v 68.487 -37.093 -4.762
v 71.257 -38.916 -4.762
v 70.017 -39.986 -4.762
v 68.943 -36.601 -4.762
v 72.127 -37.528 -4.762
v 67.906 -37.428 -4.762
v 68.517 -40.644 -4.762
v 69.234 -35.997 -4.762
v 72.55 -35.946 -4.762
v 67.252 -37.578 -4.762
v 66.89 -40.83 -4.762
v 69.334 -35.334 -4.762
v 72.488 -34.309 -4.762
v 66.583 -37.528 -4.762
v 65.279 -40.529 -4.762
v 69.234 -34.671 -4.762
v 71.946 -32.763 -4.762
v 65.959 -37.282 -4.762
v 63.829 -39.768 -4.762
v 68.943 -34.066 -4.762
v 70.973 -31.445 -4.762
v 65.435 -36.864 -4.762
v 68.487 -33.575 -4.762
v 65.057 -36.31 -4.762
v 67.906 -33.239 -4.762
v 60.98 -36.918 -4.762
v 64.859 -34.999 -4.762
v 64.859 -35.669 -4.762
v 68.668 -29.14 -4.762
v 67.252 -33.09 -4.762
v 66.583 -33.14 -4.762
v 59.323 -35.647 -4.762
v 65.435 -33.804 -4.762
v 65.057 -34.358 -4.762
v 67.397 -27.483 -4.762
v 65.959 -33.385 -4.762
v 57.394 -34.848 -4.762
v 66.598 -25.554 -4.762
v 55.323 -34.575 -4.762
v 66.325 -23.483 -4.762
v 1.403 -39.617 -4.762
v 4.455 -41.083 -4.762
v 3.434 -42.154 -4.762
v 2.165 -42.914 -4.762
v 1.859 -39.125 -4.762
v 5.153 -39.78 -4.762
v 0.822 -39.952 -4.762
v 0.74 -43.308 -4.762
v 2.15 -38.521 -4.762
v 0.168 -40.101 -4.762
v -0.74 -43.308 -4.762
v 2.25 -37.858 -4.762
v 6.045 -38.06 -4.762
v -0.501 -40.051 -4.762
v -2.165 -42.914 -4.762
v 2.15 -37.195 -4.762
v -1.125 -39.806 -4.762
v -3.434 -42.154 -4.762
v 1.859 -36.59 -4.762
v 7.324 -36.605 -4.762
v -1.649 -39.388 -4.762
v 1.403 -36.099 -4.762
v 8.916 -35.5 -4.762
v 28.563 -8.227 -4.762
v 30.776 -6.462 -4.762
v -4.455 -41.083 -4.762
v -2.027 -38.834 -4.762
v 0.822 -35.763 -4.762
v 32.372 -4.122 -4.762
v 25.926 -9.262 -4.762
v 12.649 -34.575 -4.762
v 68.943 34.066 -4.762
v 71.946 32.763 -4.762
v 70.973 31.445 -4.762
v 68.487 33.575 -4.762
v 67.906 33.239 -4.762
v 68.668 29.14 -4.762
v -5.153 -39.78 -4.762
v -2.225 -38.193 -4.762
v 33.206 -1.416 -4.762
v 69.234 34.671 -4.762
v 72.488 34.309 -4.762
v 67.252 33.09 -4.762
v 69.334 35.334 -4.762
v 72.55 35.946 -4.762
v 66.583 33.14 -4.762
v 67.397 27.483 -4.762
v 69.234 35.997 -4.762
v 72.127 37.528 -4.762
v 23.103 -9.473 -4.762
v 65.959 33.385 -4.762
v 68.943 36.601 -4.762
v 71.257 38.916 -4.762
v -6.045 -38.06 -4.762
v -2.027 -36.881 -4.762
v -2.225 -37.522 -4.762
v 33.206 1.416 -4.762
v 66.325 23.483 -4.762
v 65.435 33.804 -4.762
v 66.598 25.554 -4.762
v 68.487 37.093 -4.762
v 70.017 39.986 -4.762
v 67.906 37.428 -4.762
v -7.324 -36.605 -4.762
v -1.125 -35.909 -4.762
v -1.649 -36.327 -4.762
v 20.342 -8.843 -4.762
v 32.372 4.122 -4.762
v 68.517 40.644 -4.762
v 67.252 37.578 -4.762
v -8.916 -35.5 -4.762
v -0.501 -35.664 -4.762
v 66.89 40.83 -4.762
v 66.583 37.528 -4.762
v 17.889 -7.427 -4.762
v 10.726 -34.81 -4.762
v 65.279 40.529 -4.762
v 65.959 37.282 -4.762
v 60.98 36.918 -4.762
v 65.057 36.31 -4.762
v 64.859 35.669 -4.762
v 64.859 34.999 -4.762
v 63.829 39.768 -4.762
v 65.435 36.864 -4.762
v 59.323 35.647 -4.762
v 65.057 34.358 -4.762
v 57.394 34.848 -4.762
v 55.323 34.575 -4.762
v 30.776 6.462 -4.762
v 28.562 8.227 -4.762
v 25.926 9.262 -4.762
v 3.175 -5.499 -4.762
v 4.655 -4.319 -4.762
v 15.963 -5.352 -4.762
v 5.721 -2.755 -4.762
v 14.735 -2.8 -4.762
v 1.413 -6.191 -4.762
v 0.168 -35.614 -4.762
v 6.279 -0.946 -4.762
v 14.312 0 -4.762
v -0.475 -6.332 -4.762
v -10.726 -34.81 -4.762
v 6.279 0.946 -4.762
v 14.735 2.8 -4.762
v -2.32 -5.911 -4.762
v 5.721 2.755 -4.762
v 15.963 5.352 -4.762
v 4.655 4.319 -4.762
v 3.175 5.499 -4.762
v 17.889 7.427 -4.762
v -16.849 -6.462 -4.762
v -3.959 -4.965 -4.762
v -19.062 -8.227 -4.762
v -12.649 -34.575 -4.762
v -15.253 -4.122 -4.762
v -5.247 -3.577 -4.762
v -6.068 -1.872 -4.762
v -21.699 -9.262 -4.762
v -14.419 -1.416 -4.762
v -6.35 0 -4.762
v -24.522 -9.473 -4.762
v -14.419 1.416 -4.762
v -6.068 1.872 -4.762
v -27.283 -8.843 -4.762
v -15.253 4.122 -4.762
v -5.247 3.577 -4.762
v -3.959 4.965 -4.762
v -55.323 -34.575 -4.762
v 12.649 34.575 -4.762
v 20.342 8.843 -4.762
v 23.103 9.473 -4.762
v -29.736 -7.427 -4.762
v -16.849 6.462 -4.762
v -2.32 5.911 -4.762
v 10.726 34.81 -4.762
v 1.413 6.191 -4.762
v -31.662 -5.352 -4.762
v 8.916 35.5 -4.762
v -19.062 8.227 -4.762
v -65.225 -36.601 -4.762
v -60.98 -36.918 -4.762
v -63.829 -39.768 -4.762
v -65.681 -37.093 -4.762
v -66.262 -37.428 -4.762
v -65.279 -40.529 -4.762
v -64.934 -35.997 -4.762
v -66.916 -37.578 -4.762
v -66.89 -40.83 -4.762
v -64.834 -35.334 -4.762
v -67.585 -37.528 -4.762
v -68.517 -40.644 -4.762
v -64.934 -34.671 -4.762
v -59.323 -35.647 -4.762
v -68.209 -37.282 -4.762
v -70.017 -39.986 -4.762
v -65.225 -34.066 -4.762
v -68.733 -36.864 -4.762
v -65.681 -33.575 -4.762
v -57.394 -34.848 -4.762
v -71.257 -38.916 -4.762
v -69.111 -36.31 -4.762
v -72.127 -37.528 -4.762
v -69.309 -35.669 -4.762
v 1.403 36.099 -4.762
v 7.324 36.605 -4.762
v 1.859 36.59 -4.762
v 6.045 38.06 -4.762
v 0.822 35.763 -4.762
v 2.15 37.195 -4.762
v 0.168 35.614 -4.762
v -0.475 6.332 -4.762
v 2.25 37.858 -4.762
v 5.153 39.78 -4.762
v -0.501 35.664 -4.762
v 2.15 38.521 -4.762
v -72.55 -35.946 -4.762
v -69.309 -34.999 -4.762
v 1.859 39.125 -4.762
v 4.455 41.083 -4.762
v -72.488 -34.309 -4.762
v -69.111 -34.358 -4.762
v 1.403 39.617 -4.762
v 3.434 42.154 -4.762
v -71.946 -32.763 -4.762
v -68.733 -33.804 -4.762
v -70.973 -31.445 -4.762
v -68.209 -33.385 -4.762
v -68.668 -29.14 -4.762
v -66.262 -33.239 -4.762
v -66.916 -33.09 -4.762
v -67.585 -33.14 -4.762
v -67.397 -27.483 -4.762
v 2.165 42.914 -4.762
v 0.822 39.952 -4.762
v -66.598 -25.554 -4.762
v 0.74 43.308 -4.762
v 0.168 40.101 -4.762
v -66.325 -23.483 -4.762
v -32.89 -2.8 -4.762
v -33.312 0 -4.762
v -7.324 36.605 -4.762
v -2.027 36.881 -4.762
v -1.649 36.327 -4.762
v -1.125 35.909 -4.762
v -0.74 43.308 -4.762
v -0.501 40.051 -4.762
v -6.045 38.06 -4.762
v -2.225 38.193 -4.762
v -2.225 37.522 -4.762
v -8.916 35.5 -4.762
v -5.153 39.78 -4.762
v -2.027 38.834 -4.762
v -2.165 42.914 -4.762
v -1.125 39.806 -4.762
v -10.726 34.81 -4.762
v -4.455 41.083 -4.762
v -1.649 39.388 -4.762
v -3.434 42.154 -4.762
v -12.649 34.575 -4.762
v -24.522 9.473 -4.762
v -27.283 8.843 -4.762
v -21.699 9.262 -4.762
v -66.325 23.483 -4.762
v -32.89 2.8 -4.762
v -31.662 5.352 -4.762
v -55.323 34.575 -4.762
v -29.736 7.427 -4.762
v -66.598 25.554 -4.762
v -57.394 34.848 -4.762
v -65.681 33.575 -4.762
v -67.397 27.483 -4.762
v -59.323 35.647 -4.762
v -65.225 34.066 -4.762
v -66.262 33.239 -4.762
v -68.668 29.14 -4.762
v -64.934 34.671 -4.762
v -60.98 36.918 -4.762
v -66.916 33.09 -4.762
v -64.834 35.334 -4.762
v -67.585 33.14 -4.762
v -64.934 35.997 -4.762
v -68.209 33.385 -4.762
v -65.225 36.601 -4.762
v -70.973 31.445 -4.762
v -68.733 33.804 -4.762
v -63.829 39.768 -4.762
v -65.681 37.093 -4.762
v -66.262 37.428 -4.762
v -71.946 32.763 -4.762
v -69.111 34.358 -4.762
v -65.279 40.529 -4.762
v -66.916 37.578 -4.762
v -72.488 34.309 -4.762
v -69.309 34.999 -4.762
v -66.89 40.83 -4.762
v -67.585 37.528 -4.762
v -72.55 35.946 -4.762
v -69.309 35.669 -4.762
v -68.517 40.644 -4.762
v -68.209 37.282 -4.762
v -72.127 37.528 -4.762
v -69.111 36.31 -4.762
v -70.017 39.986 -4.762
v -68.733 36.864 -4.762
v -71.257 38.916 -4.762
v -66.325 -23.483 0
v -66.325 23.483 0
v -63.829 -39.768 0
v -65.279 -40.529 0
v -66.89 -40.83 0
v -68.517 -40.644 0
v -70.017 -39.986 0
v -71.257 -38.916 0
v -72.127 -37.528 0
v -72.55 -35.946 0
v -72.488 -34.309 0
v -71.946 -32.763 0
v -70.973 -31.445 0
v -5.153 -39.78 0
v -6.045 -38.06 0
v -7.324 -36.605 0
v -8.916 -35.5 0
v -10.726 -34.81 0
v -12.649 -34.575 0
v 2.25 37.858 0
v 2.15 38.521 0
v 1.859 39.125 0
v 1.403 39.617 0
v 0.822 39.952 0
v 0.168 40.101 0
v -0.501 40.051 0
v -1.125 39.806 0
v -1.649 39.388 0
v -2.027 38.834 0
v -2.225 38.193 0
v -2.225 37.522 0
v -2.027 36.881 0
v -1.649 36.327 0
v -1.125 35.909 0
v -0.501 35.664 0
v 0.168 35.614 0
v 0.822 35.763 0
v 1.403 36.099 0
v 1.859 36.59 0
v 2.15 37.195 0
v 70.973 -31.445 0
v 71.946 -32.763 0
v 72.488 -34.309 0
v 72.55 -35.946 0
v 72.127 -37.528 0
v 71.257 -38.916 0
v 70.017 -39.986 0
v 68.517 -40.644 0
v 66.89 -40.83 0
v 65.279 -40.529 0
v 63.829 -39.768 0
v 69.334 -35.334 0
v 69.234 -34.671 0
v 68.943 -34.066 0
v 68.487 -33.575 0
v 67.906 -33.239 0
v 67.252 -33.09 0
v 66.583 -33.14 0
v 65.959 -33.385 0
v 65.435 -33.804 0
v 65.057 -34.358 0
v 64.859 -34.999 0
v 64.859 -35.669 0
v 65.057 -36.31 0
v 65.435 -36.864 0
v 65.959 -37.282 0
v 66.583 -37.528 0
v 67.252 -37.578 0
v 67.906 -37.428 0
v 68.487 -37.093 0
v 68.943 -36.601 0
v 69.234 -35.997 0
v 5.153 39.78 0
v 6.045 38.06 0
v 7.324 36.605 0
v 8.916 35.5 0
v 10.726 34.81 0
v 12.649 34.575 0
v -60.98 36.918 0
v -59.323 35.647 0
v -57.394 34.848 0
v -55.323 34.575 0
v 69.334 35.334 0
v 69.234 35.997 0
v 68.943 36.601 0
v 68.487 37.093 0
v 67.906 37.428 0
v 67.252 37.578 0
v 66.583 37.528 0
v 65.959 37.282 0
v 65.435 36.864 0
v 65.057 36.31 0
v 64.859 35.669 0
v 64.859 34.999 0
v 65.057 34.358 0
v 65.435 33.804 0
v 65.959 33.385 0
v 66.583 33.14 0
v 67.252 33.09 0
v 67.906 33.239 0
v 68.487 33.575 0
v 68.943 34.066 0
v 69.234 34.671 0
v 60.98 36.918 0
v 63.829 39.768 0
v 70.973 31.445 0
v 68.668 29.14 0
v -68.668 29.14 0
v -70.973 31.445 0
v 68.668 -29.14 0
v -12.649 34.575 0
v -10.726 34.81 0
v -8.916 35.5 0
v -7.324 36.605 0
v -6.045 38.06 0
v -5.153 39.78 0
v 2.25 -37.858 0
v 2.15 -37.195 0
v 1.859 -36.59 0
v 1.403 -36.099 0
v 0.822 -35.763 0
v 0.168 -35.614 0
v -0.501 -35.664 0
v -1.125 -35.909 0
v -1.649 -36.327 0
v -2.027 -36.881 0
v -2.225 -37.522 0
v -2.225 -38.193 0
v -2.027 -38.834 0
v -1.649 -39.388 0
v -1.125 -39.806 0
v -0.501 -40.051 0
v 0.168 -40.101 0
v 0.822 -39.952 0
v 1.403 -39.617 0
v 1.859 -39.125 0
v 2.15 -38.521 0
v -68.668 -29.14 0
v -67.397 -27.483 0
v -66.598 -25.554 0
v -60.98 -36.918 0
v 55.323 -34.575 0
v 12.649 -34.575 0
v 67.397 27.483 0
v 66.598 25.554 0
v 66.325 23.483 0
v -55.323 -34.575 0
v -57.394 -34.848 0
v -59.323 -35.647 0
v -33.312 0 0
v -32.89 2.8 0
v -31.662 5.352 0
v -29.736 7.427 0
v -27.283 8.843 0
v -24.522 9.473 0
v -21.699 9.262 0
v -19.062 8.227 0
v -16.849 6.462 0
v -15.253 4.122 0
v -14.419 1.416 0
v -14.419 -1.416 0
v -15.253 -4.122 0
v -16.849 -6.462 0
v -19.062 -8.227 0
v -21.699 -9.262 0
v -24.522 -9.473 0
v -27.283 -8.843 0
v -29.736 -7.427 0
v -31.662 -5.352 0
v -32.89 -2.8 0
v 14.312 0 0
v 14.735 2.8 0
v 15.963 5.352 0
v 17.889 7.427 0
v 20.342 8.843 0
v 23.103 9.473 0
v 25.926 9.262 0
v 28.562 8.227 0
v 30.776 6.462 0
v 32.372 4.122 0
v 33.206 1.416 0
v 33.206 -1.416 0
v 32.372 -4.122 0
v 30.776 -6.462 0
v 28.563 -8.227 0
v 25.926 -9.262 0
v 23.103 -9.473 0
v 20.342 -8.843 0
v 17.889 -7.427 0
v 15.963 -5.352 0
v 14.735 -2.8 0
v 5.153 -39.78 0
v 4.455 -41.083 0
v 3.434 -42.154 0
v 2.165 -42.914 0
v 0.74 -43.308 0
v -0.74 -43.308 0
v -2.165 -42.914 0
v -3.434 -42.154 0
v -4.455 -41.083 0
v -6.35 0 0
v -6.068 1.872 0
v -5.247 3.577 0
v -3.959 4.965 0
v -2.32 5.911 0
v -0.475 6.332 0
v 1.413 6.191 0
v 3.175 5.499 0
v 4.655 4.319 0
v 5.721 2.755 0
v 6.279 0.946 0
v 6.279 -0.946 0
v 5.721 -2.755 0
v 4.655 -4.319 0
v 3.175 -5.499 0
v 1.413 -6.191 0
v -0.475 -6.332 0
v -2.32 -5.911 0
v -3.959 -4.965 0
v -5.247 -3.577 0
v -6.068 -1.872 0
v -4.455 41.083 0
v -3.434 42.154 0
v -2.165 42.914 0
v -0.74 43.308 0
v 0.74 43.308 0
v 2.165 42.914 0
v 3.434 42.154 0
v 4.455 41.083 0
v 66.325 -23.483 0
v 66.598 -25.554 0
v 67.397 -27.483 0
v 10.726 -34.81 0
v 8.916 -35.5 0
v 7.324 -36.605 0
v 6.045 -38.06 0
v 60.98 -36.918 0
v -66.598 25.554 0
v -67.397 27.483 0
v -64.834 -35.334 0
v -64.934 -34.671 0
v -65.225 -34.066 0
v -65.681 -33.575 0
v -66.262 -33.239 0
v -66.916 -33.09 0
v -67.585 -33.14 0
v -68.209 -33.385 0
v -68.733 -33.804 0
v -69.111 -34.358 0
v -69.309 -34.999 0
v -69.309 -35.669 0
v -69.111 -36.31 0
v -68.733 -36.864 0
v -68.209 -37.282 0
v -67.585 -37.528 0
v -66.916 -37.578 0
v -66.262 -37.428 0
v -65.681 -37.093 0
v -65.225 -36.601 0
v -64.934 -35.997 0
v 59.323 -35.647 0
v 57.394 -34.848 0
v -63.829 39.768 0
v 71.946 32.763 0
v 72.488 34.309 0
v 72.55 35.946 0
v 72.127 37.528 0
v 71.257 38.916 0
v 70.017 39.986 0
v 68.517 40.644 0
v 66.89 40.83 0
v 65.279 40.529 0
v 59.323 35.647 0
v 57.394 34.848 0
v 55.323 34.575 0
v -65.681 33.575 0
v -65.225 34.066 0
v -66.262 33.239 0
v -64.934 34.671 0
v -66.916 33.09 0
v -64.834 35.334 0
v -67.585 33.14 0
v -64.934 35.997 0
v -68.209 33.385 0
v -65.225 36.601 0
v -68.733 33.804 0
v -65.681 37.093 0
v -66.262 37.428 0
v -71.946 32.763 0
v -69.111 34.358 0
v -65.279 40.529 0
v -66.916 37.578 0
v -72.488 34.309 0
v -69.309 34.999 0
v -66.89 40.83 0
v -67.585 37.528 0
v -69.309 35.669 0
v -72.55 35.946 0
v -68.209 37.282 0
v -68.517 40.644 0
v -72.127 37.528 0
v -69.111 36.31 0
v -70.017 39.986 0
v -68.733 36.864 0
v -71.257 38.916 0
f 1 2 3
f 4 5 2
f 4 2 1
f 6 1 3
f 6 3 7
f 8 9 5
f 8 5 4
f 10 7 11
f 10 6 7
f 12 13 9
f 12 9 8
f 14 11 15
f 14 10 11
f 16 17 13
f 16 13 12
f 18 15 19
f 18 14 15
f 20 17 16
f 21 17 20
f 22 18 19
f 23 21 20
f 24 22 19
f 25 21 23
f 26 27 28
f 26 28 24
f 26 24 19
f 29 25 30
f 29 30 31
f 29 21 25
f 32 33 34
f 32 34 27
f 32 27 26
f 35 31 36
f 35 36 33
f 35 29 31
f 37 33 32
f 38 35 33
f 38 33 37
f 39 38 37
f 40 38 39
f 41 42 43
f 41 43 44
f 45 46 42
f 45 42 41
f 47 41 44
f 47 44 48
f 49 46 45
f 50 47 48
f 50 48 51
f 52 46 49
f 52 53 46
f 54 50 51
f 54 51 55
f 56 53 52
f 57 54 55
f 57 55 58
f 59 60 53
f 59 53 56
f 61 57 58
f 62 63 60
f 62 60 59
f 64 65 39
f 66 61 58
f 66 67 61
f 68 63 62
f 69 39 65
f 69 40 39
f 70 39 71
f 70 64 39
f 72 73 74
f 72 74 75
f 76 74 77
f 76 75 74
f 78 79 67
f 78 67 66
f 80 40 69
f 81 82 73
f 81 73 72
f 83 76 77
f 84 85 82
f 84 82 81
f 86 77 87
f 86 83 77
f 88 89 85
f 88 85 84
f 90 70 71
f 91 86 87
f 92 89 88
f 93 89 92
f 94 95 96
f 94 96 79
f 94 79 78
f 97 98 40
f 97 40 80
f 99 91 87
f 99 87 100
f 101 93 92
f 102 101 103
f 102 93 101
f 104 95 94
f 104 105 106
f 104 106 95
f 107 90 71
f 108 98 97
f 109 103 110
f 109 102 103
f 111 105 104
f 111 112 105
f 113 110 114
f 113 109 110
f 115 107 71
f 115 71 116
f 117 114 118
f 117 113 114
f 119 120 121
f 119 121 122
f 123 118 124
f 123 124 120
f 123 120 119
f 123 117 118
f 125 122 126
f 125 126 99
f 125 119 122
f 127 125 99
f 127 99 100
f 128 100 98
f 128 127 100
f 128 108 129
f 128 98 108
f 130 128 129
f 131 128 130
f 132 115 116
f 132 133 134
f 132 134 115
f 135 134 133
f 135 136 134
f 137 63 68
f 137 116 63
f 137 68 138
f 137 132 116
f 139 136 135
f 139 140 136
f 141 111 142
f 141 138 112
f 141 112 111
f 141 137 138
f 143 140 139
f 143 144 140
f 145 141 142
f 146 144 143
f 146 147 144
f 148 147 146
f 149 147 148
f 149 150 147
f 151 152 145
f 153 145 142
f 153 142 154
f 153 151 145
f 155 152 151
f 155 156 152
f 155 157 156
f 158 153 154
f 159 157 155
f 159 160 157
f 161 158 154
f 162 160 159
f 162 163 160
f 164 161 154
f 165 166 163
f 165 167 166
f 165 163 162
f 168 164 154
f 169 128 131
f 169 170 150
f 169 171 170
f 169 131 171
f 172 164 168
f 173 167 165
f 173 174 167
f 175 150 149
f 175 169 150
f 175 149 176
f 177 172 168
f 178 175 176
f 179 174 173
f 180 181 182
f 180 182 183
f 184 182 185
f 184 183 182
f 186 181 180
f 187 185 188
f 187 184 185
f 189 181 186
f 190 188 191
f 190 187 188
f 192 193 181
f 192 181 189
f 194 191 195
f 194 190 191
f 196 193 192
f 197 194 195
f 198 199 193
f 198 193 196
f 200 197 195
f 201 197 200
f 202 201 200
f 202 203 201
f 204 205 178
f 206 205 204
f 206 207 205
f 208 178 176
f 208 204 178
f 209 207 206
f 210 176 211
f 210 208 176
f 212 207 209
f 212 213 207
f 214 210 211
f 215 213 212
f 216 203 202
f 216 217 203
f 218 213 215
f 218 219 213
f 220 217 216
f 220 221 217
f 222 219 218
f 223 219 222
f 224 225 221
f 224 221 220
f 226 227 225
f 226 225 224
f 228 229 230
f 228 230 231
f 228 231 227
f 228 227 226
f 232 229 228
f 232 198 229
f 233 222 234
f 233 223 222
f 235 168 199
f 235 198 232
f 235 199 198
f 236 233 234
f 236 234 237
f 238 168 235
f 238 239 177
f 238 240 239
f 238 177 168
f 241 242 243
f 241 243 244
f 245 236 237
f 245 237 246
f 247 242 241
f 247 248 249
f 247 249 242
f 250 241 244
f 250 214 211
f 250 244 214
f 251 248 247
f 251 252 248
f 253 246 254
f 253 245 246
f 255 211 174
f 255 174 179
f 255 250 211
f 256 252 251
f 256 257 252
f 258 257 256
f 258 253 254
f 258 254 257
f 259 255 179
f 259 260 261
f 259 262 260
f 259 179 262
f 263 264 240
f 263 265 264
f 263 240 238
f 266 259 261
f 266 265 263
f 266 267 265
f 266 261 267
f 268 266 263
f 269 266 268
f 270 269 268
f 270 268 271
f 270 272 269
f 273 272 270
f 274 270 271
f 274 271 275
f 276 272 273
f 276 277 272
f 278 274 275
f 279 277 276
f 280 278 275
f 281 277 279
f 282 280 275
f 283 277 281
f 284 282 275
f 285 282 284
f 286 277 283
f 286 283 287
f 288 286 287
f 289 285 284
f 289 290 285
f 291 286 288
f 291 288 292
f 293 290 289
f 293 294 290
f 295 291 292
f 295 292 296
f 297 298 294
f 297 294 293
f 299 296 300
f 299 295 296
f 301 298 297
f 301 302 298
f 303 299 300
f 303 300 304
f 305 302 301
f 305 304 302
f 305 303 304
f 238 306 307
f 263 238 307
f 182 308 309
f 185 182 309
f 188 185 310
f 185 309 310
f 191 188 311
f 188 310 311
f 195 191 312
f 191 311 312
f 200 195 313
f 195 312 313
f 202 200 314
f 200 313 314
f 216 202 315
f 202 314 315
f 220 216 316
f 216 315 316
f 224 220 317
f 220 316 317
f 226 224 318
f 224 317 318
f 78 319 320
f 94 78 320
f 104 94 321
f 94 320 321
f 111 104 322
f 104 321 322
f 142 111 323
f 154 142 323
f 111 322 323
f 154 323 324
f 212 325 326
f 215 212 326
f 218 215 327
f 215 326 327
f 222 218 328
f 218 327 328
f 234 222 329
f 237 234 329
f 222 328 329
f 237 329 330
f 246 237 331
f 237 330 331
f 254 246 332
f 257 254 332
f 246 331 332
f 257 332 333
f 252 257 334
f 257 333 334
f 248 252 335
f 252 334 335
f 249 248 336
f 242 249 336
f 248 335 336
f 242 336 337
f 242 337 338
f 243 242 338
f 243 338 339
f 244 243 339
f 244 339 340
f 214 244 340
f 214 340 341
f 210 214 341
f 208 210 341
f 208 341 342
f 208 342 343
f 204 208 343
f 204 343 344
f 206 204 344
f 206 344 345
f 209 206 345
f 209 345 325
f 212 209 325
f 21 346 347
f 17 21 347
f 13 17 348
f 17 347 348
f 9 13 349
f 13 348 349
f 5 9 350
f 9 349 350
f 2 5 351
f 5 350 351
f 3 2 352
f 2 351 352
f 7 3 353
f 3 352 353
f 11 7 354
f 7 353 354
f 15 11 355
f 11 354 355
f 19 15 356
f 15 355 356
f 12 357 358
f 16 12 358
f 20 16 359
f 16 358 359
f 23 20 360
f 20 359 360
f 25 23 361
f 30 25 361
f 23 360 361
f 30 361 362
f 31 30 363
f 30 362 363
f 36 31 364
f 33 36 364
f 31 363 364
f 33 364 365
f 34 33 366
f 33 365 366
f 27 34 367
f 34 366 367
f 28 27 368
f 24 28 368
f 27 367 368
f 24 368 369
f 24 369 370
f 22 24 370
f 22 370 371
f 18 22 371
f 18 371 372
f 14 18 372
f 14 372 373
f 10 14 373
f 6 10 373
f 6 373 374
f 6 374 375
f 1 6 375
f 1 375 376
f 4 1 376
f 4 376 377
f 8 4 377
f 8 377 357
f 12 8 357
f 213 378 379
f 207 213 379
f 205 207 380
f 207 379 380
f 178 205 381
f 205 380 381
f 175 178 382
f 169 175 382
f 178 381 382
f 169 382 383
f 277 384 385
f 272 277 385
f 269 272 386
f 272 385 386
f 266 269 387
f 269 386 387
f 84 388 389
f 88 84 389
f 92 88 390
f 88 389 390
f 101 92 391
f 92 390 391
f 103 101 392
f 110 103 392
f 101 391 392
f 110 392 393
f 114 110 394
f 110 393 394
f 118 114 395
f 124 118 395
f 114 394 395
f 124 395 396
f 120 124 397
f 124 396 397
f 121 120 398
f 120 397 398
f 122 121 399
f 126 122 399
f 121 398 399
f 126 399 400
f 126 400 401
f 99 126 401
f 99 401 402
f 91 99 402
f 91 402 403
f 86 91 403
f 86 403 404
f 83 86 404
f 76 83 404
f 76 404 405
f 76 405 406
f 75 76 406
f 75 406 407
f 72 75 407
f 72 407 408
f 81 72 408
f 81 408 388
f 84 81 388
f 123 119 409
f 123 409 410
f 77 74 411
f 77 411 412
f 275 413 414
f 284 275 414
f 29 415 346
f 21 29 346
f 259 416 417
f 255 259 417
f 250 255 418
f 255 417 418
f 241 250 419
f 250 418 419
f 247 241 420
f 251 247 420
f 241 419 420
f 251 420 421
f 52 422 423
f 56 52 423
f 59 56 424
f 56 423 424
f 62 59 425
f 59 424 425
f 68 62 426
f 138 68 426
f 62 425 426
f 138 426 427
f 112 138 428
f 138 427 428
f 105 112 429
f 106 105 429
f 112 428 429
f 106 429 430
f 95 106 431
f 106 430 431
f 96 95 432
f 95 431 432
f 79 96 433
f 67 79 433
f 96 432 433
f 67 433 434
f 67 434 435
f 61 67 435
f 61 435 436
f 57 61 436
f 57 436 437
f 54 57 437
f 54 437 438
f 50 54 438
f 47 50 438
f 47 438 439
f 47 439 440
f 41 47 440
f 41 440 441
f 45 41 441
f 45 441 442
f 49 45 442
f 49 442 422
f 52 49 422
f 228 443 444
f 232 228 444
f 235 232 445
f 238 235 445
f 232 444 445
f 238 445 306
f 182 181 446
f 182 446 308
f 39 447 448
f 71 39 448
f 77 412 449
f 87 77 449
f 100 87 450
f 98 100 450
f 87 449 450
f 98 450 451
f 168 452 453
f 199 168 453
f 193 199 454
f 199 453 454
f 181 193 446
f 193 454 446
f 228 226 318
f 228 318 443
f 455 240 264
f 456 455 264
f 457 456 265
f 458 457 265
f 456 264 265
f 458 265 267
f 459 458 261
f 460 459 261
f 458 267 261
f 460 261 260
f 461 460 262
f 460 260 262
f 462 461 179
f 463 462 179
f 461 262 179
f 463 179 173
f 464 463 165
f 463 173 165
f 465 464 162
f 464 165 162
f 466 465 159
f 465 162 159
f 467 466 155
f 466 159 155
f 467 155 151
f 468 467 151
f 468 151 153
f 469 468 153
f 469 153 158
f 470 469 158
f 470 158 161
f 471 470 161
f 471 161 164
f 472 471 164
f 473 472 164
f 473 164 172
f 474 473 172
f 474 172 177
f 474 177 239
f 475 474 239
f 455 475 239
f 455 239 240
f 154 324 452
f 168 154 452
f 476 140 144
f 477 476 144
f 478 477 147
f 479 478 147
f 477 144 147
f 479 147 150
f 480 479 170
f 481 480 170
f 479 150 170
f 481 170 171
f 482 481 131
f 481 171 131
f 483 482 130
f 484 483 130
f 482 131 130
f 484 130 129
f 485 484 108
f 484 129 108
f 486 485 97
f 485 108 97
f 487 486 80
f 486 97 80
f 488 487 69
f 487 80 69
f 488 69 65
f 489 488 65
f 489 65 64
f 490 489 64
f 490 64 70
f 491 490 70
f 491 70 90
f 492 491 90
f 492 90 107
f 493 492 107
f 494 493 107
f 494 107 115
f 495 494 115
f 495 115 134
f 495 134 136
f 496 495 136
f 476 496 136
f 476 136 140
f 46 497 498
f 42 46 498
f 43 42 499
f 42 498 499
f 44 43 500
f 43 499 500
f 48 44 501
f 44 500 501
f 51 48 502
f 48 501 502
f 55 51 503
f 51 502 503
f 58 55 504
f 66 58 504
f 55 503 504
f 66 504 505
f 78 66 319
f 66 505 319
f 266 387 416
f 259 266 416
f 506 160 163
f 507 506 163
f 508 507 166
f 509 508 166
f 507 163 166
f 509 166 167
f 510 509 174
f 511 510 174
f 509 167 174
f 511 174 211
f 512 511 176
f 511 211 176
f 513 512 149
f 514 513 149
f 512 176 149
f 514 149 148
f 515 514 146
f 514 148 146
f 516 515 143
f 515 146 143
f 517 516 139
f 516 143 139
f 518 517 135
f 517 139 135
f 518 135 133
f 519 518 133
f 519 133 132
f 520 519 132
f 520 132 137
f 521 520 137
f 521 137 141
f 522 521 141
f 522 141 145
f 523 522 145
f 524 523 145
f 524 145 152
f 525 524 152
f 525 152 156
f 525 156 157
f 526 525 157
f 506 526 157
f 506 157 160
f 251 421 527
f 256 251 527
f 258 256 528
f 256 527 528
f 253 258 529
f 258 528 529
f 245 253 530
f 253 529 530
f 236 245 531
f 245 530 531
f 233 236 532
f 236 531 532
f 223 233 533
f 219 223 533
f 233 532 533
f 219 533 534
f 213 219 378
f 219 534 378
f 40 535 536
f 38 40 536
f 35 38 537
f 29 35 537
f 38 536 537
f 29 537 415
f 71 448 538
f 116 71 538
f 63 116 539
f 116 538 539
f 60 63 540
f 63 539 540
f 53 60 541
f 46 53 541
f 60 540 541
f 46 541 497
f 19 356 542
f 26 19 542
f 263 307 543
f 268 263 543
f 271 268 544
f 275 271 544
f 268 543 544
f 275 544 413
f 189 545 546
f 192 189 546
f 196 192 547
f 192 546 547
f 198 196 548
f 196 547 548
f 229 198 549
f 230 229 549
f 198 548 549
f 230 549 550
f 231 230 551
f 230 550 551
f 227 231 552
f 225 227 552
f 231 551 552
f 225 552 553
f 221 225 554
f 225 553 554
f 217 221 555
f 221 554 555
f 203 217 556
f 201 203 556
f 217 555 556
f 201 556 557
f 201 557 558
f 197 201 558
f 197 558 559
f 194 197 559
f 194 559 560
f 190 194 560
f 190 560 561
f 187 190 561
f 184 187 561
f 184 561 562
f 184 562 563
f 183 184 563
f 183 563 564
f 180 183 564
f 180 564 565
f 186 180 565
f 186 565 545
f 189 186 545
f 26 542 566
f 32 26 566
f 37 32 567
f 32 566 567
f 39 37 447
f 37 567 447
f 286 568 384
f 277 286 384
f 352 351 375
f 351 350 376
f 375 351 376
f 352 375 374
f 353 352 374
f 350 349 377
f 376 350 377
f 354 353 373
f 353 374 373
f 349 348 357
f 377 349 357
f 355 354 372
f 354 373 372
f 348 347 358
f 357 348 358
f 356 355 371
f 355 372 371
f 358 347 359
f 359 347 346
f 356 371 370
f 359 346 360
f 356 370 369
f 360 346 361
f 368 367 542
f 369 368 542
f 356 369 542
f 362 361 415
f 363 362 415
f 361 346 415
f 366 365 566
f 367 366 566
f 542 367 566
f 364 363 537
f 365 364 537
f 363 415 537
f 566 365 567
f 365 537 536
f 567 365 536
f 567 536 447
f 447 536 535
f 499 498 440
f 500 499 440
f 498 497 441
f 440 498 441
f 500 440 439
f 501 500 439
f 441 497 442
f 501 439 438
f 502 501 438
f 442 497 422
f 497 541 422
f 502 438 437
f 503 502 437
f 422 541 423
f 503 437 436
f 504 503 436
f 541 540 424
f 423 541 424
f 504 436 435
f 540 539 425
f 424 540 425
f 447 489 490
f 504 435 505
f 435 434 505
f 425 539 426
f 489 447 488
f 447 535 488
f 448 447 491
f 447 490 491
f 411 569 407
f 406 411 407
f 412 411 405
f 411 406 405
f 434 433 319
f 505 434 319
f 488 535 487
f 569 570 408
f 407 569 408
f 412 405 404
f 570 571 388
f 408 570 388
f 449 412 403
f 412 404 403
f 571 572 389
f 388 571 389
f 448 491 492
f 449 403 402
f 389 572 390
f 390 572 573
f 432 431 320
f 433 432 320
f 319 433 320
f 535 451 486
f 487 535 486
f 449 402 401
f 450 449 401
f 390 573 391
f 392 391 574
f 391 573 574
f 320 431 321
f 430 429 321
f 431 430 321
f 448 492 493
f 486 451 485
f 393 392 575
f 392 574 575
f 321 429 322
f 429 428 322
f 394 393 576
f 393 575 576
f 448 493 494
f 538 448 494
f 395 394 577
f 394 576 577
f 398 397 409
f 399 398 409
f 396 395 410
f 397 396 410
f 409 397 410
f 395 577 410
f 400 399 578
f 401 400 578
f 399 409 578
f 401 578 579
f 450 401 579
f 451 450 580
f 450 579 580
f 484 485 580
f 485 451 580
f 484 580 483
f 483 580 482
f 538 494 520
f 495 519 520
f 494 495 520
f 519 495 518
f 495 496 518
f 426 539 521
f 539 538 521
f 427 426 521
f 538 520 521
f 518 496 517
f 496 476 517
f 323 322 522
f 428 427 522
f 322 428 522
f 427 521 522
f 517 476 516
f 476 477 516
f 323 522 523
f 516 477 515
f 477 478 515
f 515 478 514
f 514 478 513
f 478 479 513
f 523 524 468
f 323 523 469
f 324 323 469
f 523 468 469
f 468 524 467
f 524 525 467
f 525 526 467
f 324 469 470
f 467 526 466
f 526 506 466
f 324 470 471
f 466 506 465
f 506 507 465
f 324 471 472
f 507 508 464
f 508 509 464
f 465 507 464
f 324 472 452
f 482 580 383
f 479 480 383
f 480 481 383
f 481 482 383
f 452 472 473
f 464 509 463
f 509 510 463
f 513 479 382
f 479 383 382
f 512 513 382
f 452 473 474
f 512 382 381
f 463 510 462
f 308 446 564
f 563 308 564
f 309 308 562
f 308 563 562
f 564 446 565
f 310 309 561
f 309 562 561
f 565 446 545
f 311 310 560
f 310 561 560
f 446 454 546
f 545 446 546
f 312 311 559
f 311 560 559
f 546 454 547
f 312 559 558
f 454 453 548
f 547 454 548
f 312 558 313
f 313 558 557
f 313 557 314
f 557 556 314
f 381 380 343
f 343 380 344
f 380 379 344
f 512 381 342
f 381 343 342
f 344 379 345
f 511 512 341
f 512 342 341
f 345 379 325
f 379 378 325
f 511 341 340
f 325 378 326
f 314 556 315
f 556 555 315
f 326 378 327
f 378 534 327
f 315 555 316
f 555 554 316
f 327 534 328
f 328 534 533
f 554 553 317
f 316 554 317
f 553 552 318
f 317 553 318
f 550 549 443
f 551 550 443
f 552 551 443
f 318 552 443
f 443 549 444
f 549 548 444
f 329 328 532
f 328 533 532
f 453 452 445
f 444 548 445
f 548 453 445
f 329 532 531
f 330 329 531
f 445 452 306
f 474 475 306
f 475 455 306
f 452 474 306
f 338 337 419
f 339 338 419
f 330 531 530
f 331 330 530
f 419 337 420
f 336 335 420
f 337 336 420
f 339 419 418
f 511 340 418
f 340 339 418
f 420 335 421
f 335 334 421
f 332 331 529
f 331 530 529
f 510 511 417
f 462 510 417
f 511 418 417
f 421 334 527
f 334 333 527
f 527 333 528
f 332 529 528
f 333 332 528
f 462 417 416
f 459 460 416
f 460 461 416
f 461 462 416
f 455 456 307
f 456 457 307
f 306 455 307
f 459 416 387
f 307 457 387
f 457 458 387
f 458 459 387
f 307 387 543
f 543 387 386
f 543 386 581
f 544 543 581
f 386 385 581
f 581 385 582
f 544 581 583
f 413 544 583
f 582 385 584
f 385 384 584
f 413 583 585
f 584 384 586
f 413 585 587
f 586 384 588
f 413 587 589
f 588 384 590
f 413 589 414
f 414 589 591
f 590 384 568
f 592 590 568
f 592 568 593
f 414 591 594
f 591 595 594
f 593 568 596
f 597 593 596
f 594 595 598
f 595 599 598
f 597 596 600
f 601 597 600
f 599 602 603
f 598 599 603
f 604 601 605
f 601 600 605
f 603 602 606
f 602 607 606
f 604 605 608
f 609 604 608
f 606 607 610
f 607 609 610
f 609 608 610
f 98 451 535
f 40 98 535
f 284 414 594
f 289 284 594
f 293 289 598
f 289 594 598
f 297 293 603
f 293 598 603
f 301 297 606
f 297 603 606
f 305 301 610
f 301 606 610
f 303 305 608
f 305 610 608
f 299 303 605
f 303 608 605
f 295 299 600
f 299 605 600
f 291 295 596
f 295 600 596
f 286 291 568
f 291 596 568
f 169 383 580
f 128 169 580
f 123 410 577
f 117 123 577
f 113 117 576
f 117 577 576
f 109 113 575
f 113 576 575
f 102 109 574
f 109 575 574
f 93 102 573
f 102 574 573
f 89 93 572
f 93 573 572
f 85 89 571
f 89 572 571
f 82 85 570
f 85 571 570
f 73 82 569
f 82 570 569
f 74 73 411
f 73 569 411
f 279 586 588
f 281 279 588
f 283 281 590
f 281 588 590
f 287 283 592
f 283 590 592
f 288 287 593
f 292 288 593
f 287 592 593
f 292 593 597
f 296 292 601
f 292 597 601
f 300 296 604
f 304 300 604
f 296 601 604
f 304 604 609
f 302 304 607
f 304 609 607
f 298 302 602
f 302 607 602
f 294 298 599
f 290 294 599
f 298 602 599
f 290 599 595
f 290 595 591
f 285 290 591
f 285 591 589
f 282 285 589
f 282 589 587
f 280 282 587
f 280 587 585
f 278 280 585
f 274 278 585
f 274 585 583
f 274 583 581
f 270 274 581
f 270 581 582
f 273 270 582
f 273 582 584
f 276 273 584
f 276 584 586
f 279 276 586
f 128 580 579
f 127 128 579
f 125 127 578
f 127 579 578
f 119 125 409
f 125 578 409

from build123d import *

# Parameters (mm, degrees)
BOSS_EXTRUDE1_DEPTH  = 4.7625
M4_CLEARANCE_HOLE1_D = 4.5
SKETCH4_R            = 6.35
SKETCH4_R_2          = 9.5
CUT_EXTRUDE1_DEPTH   = 85.681745462


with BuildPart() as part:
    # Sketch1 → Boss-Extrude1 (new body)
    with BuildSketch(Plane.XY):
        with BuildLine():
            ThreePointArc((68.668145751, 29.139971157), (66.93396374, 26.544584367), (66.325, 23.483116908))
            Line((66.325, 23.483116908), (66.325, -23.483116908))
            ThreePointArc((66.325, -23.483116908), (66.93396374, -26.544584367), (68.668145751, -29.139971157))
            Line((68.668145751, -29.139971157), (70.973014298, -31.444839705))
            ThreePointArc((70.973014298, -31.444839705), (71.257349949, -38.916180607), (63.829230118, -39.767542704))
            Line((63.829230118, -39.767542704), (60.979833165, -36.918145751))
            ThreePointArc((60.979833165, -36.918145751), (58.384446374, -35.18396374), (55.322978915, -34.575))
            Line((55.322978915, -34.575), (12.648995245, -34.575))
            ThreePointArc((12.648995245, -34.575), (8.086292992, -36.003717922), (5.153294359, -39.779562963))
            ThreePointArc((5.153294359, -39.779562963), (0, -43.3577), (-5.153294359, -39.779562963))
            ThreePointArc((-5.153294359, -39.779562963), (-8.086292992, -36.003717922), (-12.648995245, -34.575))
            Line((-12.648995245, -34.575), (-55.322978915, -34.575))
            ThreePointArc((-55.322978915, -34.575), (-58.384446374, -35.18396374), (-60.979833165, -36.918145751))
            Line((-60.979833165, -36.918145751), (-63.829230118, -39.767542704))
            ThreePointArc((-63.829230118, -39.767542704), (-71.257349949, -38.916180607), (-70.973014298, -31.444839705))
            Line((-70.973014298, -31.444839705), (-68.668145751, -29.139971157))
            ThreePointArc((-68.668145751, -29.139971157), (-66.93396374, -26.544584367), (-66.325, -23.483116908))
            Line((-66.325, -23.483116908), (-66.325, 23.483116908))
            ThreePointArc((-66.325, 23.483116908), (-66.93396374, 26.544584367), (-68.668145751, 29.139971157))
            Line((-68.668145751, 29.139971157), (-70.973014298, 31.444839705))
            ThreePointArc((-70.973014298, 31.444839705), (-71.257349949, 38.916180607), (-63.829230118, 39.767542704))
            Line((-63.829230118, 39.767542704), (-60.979833165, 36.918145751))
            ThreePointArc((-60.979833165, 36.918145751), (-58.384446374, 35.18396374), (-55.322978915, 34.575))
            Line((-55.322978915, 34.575), (-12.648995245, 34.575))
            ThreePointArc((-12.648995245, 34.575), (-8.086292992, 36.003717922), (-5.153294359, 39.779562963))
            ThreePointArc((-5.153294359, 39.779562963), (0, 43.3577), (5.153294359, 39.779562963))
            ThreePointArc((5.153294359, 39.779562963), (8.086292992, 36.003717922), (12.648995245, 34.575))
            Line((12.648995245, 34.575), (55.322978915, 34.575))
            ThreePointArc((55.322978915, 34.575), (58.384446374, 35.18396374), (60.979833165, 36.918145751))
            Line((60.979833165, 36.918145751), (63.829230118, 39.767542704))
            ThreePointArc((63.829230118, 39.767542704), (71.257349949, 38.916180607), (70.973014298, 31.444839705))
            Line((70.973014298, 31.444839705), (68.668145751, 29.139971157))
        make_face()
    extrude(amount=-BOSS_EXTRUDE1_DEPTH)

    # M4 Clearance Hole1 (through all)
    with Locations(Plane(origin=(0, 0, -4.7625), x_dir=(-1, 0, 0), z_dir=(0, 0, -1))):
        with Locations((-67.083927001, -35.333927001), (-67.083927001, 35.333927001), (0, 37.8577), (67.083927001, 35.333927001), (67.083927001, -35.333927001), (0, -37.8577)):
            Hole(M4_CLEARANCE_HOLE1_D / 2)

    # Sketch4 → Cut-Extrude1 (cut, through all)
    with BuildSketch(Plane(origin=(0, 0, -4.7625), x_dir=(-1, 0, 0), z_dir=(0, 0, -1))):
        Circle(SKETCH4_R)
        with Locations((-23.8125, 0)):
            Circle(SKETCH4_R_2)
        with Locations((23.8125, 0)):
            Circle(SKETCH4_R_2)
    extrude(amount=-CUT_EXTRUDE1_DEPTH, mode=Mode.SUBTRACT)


solid = part.part
